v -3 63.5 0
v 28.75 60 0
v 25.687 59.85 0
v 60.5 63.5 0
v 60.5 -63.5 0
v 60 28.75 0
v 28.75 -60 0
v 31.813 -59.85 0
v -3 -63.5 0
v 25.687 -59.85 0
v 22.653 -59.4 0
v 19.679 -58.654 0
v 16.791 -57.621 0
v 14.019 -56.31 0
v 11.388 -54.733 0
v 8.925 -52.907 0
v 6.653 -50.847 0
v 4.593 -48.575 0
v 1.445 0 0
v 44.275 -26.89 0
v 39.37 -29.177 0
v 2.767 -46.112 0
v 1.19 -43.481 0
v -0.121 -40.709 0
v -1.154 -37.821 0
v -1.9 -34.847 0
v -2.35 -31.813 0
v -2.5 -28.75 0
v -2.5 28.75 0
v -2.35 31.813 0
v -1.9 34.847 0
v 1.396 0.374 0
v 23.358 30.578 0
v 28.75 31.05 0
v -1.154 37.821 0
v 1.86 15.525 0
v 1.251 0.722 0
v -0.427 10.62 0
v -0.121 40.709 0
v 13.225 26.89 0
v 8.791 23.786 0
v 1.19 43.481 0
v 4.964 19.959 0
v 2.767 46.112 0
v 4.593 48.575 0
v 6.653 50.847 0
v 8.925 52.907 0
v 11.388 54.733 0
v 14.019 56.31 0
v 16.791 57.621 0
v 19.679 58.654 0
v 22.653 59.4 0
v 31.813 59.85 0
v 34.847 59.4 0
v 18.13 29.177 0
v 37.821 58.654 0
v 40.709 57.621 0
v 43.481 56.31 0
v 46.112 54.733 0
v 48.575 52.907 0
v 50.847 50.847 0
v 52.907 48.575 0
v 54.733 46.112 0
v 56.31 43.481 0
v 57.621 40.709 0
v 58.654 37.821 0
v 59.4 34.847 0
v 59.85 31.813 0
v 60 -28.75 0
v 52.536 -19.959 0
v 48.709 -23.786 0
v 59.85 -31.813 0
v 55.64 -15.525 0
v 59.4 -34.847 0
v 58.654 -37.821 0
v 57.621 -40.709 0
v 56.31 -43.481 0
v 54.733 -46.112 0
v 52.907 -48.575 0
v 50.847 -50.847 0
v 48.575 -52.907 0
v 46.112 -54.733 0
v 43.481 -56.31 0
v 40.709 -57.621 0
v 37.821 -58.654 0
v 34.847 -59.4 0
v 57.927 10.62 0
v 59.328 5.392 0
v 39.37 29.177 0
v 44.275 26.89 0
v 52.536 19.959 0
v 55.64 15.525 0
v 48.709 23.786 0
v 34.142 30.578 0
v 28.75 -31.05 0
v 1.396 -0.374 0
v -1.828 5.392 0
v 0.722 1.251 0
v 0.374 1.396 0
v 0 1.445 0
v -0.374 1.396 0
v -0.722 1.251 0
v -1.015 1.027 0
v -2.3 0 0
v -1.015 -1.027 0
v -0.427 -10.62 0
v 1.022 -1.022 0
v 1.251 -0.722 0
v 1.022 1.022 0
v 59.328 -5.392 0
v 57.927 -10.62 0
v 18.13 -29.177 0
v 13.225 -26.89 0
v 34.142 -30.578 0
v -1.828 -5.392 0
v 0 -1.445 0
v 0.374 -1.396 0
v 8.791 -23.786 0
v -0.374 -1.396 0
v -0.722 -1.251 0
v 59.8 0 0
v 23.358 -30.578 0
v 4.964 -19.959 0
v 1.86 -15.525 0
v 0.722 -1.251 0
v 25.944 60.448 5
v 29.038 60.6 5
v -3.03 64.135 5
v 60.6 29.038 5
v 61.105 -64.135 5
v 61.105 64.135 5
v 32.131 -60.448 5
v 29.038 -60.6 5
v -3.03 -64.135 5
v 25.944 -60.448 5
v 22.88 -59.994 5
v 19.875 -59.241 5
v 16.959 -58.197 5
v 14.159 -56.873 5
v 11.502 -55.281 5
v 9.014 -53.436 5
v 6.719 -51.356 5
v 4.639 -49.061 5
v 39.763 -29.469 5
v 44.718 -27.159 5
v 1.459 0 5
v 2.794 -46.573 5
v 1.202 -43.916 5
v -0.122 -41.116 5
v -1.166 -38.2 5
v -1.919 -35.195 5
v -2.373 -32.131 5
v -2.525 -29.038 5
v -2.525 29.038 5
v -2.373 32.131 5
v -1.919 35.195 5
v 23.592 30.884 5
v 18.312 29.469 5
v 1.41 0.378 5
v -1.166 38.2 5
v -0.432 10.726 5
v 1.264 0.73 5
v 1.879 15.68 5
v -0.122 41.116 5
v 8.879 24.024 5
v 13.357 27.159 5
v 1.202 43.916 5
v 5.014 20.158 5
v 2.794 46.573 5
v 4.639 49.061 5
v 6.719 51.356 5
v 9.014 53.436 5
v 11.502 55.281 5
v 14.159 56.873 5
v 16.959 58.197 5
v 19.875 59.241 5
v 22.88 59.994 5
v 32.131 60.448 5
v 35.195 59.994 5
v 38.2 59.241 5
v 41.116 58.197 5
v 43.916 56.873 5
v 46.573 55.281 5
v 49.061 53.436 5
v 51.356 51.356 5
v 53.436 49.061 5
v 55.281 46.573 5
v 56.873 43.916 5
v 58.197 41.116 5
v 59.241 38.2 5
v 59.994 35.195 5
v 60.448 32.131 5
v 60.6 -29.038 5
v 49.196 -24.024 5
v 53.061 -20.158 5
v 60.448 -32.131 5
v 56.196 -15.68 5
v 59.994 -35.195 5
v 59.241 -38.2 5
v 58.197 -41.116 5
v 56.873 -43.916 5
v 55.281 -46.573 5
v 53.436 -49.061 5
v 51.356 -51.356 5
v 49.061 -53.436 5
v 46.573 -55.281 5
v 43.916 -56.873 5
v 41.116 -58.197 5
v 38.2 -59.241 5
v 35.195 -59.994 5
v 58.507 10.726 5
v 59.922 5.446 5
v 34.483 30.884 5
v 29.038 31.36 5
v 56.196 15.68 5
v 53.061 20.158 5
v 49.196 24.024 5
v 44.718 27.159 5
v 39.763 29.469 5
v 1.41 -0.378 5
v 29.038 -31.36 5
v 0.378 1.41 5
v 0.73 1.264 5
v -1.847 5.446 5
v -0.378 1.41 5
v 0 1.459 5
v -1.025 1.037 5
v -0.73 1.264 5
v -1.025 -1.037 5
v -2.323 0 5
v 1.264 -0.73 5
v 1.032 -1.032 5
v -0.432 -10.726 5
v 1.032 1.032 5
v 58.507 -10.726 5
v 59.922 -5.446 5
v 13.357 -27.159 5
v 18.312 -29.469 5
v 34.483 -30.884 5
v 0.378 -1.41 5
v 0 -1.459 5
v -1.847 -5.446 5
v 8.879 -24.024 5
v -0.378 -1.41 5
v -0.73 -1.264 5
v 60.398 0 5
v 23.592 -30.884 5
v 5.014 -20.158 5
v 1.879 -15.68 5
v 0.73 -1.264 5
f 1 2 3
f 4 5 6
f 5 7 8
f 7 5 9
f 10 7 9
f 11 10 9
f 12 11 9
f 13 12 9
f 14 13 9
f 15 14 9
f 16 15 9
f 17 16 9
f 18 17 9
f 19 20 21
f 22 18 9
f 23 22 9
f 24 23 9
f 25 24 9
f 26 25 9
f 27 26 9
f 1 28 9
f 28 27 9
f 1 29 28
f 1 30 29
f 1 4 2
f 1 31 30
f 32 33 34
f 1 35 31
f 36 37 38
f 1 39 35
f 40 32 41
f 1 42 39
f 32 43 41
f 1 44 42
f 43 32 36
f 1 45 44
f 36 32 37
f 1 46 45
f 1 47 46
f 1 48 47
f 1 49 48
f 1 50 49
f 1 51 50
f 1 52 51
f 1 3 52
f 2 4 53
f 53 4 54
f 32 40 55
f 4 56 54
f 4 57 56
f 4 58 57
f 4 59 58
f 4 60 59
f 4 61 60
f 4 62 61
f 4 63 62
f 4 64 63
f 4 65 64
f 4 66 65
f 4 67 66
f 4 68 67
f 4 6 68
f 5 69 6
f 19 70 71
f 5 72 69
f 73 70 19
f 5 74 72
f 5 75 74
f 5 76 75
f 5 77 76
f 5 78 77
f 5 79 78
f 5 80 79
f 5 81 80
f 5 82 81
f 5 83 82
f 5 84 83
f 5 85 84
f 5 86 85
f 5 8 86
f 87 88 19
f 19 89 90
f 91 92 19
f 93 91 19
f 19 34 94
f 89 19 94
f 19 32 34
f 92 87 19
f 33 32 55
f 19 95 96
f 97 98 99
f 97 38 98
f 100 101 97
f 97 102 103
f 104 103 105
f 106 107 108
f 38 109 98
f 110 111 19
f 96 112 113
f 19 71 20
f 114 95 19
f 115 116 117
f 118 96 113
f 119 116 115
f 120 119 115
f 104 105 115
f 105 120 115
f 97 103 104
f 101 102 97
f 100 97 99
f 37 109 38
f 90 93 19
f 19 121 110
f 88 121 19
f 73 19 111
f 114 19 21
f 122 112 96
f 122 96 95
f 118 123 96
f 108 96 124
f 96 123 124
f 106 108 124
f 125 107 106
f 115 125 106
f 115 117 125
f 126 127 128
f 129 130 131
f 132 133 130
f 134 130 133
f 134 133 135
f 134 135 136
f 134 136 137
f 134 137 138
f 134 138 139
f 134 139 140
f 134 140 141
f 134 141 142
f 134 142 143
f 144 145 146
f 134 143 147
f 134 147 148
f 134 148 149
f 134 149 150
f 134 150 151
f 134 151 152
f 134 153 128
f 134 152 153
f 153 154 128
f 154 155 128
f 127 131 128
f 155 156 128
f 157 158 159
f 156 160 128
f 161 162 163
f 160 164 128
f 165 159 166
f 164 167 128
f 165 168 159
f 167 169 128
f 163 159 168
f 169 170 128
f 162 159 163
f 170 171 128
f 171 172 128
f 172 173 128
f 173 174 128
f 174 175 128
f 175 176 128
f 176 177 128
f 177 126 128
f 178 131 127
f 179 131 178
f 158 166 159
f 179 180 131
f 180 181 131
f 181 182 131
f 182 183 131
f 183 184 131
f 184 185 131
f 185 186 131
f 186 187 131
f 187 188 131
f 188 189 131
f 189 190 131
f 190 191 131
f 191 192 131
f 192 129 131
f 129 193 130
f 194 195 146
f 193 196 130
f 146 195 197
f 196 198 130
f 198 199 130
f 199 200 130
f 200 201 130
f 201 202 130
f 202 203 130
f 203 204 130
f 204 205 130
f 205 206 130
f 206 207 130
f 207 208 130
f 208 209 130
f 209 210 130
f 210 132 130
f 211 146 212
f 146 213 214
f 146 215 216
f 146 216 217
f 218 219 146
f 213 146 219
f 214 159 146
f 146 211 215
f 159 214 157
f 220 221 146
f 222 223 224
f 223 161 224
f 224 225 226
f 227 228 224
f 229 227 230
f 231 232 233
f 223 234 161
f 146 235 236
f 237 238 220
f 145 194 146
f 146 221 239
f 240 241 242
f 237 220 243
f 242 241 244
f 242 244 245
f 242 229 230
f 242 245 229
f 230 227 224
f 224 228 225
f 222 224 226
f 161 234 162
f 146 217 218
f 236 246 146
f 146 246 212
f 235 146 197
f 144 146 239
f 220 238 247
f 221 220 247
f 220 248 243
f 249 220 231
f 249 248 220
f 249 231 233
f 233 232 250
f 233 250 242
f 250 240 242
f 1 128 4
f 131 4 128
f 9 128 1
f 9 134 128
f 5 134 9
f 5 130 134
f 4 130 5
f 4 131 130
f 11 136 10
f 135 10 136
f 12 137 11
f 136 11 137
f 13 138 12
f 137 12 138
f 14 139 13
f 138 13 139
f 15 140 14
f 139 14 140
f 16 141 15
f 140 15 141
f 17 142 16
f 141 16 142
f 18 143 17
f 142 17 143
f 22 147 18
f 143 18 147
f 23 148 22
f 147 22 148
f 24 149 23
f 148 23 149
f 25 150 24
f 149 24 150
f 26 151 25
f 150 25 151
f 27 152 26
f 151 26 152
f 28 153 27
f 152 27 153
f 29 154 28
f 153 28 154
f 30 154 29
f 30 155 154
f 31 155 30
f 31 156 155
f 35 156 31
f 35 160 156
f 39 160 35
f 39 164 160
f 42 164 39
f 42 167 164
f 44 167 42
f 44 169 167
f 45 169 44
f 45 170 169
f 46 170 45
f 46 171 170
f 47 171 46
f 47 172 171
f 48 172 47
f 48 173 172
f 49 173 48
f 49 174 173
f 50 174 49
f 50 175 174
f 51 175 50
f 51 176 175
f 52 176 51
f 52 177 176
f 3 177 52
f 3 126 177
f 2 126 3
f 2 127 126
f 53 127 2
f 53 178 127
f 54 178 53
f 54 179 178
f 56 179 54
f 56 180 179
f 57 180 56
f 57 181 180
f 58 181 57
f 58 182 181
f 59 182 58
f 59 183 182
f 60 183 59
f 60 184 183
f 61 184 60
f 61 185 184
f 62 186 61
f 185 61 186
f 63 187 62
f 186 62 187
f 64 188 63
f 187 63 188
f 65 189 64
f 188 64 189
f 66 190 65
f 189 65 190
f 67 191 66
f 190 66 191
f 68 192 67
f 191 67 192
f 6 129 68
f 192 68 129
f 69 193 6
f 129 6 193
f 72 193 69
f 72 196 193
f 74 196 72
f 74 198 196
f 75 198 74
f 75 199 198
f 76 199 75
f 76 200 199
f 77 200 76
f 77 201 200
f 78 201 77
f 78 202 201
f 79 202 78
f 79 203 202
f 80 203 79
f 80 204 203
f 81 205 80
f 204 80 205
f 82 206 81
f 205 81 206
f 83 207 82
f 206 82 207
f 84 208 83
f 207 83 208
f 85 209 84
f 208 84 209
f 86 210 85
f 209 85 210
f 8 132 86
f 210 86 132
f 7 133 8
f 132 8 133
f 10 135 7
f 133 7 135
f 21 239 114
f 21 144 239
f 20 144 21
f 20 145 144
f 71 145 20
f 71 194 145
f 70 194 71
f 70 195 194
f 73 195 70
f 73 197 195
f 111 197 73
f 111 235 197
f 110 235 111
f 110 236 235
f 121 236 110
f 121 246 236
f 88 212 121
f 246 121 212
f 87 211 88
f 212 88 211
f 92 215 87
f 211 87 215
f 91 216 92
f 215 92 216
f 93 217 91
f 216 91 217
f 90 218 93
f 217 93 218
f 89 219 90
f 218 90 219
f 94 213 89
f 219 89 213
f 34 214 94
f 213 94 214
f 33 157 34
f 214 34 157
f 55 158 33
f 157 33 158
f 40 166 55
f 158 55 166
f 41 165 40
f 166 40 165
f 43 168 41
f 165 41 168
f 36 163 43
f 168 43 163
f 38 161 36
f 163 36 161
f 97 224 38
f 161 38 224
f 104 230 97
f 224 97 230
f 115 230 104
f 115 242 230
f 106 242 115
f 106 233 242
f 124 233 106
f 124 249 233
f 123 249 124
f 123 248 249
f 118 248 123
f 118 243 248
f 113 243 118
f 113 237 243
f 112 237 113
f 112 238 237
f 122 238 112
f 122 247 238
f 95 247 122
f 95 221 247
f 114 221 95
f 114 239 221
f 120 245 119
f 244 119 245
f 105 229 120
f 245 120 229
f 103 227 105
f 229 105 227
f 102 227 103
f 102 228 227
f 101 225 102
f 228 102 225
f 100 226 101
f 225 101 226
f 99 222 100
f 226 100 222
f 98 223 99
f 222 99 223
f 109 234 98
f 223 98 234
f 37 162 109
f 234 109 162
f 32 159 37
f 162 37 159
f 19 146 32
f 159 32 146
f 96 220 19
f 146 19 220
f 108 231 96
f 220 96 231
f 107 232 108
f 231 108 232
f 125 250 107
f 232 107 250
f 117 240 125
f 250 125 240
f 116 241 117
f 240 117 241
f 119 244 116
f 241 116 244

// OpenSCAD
// hole investigations

side = 63.5;
travel = 60;
extracam = 2.5;
shaftD=2.89;
shaftF=2.45;

linear_extrude(height=5, scale=1.01){
    displaycam(theta=360*$t);
}

module outercam(side=side, travel=travel){
    difference(){
        square([side,side*2], center=true);
        hull(){
            translate([0,travel/2-extracam/2,0])
                circle(r=travel/2+extracam/2, $fn=64);
            translate([0,-travel/2+extracam/2,0])
                circle(r=travel/2+extracam/2, $fn=64);
        }
    }
}

module dshaft(){
    echo("shaft measurements: ", shaftD, shaftF);
    sliverx=(shaftD + shaftF)/4;
    echo("sliver-off-of-shaft centered at: ",sliverx );
    dimsliver = [shaftD - shaftF+0.2, shaftD];
    echo("and is shaped like: ", dimsliver);
    difference(){
        circle(shaftD/2, $fn=24);
        translate([-sliverx,0,0])
            square(dimsliver, center=true);
    }
}
   
module innercam(tr=travel/2, deadrad=extracam, scaler=[1.22,1.22]){
    difference(){
        circle(r=tr+deadrad/2-.2, center=true, $fn=36);
        translate([-tr+deadrad/2,0,0])
            dshaft(shaft=[2.89, 2.45]*scaler);
    }
}

module movecam(dist=travel/2 - extracam/2, ang=30){
    translate([dist*cos(ang), dist*sin(ang), 0]) rotate([0,0,ang])
        innercam();
}

module displaycam(theta=240){
    translate([cos(theta)*(travel-extracam)/2,0,0])
        outercam();
    movecam(ang=theta);
}
